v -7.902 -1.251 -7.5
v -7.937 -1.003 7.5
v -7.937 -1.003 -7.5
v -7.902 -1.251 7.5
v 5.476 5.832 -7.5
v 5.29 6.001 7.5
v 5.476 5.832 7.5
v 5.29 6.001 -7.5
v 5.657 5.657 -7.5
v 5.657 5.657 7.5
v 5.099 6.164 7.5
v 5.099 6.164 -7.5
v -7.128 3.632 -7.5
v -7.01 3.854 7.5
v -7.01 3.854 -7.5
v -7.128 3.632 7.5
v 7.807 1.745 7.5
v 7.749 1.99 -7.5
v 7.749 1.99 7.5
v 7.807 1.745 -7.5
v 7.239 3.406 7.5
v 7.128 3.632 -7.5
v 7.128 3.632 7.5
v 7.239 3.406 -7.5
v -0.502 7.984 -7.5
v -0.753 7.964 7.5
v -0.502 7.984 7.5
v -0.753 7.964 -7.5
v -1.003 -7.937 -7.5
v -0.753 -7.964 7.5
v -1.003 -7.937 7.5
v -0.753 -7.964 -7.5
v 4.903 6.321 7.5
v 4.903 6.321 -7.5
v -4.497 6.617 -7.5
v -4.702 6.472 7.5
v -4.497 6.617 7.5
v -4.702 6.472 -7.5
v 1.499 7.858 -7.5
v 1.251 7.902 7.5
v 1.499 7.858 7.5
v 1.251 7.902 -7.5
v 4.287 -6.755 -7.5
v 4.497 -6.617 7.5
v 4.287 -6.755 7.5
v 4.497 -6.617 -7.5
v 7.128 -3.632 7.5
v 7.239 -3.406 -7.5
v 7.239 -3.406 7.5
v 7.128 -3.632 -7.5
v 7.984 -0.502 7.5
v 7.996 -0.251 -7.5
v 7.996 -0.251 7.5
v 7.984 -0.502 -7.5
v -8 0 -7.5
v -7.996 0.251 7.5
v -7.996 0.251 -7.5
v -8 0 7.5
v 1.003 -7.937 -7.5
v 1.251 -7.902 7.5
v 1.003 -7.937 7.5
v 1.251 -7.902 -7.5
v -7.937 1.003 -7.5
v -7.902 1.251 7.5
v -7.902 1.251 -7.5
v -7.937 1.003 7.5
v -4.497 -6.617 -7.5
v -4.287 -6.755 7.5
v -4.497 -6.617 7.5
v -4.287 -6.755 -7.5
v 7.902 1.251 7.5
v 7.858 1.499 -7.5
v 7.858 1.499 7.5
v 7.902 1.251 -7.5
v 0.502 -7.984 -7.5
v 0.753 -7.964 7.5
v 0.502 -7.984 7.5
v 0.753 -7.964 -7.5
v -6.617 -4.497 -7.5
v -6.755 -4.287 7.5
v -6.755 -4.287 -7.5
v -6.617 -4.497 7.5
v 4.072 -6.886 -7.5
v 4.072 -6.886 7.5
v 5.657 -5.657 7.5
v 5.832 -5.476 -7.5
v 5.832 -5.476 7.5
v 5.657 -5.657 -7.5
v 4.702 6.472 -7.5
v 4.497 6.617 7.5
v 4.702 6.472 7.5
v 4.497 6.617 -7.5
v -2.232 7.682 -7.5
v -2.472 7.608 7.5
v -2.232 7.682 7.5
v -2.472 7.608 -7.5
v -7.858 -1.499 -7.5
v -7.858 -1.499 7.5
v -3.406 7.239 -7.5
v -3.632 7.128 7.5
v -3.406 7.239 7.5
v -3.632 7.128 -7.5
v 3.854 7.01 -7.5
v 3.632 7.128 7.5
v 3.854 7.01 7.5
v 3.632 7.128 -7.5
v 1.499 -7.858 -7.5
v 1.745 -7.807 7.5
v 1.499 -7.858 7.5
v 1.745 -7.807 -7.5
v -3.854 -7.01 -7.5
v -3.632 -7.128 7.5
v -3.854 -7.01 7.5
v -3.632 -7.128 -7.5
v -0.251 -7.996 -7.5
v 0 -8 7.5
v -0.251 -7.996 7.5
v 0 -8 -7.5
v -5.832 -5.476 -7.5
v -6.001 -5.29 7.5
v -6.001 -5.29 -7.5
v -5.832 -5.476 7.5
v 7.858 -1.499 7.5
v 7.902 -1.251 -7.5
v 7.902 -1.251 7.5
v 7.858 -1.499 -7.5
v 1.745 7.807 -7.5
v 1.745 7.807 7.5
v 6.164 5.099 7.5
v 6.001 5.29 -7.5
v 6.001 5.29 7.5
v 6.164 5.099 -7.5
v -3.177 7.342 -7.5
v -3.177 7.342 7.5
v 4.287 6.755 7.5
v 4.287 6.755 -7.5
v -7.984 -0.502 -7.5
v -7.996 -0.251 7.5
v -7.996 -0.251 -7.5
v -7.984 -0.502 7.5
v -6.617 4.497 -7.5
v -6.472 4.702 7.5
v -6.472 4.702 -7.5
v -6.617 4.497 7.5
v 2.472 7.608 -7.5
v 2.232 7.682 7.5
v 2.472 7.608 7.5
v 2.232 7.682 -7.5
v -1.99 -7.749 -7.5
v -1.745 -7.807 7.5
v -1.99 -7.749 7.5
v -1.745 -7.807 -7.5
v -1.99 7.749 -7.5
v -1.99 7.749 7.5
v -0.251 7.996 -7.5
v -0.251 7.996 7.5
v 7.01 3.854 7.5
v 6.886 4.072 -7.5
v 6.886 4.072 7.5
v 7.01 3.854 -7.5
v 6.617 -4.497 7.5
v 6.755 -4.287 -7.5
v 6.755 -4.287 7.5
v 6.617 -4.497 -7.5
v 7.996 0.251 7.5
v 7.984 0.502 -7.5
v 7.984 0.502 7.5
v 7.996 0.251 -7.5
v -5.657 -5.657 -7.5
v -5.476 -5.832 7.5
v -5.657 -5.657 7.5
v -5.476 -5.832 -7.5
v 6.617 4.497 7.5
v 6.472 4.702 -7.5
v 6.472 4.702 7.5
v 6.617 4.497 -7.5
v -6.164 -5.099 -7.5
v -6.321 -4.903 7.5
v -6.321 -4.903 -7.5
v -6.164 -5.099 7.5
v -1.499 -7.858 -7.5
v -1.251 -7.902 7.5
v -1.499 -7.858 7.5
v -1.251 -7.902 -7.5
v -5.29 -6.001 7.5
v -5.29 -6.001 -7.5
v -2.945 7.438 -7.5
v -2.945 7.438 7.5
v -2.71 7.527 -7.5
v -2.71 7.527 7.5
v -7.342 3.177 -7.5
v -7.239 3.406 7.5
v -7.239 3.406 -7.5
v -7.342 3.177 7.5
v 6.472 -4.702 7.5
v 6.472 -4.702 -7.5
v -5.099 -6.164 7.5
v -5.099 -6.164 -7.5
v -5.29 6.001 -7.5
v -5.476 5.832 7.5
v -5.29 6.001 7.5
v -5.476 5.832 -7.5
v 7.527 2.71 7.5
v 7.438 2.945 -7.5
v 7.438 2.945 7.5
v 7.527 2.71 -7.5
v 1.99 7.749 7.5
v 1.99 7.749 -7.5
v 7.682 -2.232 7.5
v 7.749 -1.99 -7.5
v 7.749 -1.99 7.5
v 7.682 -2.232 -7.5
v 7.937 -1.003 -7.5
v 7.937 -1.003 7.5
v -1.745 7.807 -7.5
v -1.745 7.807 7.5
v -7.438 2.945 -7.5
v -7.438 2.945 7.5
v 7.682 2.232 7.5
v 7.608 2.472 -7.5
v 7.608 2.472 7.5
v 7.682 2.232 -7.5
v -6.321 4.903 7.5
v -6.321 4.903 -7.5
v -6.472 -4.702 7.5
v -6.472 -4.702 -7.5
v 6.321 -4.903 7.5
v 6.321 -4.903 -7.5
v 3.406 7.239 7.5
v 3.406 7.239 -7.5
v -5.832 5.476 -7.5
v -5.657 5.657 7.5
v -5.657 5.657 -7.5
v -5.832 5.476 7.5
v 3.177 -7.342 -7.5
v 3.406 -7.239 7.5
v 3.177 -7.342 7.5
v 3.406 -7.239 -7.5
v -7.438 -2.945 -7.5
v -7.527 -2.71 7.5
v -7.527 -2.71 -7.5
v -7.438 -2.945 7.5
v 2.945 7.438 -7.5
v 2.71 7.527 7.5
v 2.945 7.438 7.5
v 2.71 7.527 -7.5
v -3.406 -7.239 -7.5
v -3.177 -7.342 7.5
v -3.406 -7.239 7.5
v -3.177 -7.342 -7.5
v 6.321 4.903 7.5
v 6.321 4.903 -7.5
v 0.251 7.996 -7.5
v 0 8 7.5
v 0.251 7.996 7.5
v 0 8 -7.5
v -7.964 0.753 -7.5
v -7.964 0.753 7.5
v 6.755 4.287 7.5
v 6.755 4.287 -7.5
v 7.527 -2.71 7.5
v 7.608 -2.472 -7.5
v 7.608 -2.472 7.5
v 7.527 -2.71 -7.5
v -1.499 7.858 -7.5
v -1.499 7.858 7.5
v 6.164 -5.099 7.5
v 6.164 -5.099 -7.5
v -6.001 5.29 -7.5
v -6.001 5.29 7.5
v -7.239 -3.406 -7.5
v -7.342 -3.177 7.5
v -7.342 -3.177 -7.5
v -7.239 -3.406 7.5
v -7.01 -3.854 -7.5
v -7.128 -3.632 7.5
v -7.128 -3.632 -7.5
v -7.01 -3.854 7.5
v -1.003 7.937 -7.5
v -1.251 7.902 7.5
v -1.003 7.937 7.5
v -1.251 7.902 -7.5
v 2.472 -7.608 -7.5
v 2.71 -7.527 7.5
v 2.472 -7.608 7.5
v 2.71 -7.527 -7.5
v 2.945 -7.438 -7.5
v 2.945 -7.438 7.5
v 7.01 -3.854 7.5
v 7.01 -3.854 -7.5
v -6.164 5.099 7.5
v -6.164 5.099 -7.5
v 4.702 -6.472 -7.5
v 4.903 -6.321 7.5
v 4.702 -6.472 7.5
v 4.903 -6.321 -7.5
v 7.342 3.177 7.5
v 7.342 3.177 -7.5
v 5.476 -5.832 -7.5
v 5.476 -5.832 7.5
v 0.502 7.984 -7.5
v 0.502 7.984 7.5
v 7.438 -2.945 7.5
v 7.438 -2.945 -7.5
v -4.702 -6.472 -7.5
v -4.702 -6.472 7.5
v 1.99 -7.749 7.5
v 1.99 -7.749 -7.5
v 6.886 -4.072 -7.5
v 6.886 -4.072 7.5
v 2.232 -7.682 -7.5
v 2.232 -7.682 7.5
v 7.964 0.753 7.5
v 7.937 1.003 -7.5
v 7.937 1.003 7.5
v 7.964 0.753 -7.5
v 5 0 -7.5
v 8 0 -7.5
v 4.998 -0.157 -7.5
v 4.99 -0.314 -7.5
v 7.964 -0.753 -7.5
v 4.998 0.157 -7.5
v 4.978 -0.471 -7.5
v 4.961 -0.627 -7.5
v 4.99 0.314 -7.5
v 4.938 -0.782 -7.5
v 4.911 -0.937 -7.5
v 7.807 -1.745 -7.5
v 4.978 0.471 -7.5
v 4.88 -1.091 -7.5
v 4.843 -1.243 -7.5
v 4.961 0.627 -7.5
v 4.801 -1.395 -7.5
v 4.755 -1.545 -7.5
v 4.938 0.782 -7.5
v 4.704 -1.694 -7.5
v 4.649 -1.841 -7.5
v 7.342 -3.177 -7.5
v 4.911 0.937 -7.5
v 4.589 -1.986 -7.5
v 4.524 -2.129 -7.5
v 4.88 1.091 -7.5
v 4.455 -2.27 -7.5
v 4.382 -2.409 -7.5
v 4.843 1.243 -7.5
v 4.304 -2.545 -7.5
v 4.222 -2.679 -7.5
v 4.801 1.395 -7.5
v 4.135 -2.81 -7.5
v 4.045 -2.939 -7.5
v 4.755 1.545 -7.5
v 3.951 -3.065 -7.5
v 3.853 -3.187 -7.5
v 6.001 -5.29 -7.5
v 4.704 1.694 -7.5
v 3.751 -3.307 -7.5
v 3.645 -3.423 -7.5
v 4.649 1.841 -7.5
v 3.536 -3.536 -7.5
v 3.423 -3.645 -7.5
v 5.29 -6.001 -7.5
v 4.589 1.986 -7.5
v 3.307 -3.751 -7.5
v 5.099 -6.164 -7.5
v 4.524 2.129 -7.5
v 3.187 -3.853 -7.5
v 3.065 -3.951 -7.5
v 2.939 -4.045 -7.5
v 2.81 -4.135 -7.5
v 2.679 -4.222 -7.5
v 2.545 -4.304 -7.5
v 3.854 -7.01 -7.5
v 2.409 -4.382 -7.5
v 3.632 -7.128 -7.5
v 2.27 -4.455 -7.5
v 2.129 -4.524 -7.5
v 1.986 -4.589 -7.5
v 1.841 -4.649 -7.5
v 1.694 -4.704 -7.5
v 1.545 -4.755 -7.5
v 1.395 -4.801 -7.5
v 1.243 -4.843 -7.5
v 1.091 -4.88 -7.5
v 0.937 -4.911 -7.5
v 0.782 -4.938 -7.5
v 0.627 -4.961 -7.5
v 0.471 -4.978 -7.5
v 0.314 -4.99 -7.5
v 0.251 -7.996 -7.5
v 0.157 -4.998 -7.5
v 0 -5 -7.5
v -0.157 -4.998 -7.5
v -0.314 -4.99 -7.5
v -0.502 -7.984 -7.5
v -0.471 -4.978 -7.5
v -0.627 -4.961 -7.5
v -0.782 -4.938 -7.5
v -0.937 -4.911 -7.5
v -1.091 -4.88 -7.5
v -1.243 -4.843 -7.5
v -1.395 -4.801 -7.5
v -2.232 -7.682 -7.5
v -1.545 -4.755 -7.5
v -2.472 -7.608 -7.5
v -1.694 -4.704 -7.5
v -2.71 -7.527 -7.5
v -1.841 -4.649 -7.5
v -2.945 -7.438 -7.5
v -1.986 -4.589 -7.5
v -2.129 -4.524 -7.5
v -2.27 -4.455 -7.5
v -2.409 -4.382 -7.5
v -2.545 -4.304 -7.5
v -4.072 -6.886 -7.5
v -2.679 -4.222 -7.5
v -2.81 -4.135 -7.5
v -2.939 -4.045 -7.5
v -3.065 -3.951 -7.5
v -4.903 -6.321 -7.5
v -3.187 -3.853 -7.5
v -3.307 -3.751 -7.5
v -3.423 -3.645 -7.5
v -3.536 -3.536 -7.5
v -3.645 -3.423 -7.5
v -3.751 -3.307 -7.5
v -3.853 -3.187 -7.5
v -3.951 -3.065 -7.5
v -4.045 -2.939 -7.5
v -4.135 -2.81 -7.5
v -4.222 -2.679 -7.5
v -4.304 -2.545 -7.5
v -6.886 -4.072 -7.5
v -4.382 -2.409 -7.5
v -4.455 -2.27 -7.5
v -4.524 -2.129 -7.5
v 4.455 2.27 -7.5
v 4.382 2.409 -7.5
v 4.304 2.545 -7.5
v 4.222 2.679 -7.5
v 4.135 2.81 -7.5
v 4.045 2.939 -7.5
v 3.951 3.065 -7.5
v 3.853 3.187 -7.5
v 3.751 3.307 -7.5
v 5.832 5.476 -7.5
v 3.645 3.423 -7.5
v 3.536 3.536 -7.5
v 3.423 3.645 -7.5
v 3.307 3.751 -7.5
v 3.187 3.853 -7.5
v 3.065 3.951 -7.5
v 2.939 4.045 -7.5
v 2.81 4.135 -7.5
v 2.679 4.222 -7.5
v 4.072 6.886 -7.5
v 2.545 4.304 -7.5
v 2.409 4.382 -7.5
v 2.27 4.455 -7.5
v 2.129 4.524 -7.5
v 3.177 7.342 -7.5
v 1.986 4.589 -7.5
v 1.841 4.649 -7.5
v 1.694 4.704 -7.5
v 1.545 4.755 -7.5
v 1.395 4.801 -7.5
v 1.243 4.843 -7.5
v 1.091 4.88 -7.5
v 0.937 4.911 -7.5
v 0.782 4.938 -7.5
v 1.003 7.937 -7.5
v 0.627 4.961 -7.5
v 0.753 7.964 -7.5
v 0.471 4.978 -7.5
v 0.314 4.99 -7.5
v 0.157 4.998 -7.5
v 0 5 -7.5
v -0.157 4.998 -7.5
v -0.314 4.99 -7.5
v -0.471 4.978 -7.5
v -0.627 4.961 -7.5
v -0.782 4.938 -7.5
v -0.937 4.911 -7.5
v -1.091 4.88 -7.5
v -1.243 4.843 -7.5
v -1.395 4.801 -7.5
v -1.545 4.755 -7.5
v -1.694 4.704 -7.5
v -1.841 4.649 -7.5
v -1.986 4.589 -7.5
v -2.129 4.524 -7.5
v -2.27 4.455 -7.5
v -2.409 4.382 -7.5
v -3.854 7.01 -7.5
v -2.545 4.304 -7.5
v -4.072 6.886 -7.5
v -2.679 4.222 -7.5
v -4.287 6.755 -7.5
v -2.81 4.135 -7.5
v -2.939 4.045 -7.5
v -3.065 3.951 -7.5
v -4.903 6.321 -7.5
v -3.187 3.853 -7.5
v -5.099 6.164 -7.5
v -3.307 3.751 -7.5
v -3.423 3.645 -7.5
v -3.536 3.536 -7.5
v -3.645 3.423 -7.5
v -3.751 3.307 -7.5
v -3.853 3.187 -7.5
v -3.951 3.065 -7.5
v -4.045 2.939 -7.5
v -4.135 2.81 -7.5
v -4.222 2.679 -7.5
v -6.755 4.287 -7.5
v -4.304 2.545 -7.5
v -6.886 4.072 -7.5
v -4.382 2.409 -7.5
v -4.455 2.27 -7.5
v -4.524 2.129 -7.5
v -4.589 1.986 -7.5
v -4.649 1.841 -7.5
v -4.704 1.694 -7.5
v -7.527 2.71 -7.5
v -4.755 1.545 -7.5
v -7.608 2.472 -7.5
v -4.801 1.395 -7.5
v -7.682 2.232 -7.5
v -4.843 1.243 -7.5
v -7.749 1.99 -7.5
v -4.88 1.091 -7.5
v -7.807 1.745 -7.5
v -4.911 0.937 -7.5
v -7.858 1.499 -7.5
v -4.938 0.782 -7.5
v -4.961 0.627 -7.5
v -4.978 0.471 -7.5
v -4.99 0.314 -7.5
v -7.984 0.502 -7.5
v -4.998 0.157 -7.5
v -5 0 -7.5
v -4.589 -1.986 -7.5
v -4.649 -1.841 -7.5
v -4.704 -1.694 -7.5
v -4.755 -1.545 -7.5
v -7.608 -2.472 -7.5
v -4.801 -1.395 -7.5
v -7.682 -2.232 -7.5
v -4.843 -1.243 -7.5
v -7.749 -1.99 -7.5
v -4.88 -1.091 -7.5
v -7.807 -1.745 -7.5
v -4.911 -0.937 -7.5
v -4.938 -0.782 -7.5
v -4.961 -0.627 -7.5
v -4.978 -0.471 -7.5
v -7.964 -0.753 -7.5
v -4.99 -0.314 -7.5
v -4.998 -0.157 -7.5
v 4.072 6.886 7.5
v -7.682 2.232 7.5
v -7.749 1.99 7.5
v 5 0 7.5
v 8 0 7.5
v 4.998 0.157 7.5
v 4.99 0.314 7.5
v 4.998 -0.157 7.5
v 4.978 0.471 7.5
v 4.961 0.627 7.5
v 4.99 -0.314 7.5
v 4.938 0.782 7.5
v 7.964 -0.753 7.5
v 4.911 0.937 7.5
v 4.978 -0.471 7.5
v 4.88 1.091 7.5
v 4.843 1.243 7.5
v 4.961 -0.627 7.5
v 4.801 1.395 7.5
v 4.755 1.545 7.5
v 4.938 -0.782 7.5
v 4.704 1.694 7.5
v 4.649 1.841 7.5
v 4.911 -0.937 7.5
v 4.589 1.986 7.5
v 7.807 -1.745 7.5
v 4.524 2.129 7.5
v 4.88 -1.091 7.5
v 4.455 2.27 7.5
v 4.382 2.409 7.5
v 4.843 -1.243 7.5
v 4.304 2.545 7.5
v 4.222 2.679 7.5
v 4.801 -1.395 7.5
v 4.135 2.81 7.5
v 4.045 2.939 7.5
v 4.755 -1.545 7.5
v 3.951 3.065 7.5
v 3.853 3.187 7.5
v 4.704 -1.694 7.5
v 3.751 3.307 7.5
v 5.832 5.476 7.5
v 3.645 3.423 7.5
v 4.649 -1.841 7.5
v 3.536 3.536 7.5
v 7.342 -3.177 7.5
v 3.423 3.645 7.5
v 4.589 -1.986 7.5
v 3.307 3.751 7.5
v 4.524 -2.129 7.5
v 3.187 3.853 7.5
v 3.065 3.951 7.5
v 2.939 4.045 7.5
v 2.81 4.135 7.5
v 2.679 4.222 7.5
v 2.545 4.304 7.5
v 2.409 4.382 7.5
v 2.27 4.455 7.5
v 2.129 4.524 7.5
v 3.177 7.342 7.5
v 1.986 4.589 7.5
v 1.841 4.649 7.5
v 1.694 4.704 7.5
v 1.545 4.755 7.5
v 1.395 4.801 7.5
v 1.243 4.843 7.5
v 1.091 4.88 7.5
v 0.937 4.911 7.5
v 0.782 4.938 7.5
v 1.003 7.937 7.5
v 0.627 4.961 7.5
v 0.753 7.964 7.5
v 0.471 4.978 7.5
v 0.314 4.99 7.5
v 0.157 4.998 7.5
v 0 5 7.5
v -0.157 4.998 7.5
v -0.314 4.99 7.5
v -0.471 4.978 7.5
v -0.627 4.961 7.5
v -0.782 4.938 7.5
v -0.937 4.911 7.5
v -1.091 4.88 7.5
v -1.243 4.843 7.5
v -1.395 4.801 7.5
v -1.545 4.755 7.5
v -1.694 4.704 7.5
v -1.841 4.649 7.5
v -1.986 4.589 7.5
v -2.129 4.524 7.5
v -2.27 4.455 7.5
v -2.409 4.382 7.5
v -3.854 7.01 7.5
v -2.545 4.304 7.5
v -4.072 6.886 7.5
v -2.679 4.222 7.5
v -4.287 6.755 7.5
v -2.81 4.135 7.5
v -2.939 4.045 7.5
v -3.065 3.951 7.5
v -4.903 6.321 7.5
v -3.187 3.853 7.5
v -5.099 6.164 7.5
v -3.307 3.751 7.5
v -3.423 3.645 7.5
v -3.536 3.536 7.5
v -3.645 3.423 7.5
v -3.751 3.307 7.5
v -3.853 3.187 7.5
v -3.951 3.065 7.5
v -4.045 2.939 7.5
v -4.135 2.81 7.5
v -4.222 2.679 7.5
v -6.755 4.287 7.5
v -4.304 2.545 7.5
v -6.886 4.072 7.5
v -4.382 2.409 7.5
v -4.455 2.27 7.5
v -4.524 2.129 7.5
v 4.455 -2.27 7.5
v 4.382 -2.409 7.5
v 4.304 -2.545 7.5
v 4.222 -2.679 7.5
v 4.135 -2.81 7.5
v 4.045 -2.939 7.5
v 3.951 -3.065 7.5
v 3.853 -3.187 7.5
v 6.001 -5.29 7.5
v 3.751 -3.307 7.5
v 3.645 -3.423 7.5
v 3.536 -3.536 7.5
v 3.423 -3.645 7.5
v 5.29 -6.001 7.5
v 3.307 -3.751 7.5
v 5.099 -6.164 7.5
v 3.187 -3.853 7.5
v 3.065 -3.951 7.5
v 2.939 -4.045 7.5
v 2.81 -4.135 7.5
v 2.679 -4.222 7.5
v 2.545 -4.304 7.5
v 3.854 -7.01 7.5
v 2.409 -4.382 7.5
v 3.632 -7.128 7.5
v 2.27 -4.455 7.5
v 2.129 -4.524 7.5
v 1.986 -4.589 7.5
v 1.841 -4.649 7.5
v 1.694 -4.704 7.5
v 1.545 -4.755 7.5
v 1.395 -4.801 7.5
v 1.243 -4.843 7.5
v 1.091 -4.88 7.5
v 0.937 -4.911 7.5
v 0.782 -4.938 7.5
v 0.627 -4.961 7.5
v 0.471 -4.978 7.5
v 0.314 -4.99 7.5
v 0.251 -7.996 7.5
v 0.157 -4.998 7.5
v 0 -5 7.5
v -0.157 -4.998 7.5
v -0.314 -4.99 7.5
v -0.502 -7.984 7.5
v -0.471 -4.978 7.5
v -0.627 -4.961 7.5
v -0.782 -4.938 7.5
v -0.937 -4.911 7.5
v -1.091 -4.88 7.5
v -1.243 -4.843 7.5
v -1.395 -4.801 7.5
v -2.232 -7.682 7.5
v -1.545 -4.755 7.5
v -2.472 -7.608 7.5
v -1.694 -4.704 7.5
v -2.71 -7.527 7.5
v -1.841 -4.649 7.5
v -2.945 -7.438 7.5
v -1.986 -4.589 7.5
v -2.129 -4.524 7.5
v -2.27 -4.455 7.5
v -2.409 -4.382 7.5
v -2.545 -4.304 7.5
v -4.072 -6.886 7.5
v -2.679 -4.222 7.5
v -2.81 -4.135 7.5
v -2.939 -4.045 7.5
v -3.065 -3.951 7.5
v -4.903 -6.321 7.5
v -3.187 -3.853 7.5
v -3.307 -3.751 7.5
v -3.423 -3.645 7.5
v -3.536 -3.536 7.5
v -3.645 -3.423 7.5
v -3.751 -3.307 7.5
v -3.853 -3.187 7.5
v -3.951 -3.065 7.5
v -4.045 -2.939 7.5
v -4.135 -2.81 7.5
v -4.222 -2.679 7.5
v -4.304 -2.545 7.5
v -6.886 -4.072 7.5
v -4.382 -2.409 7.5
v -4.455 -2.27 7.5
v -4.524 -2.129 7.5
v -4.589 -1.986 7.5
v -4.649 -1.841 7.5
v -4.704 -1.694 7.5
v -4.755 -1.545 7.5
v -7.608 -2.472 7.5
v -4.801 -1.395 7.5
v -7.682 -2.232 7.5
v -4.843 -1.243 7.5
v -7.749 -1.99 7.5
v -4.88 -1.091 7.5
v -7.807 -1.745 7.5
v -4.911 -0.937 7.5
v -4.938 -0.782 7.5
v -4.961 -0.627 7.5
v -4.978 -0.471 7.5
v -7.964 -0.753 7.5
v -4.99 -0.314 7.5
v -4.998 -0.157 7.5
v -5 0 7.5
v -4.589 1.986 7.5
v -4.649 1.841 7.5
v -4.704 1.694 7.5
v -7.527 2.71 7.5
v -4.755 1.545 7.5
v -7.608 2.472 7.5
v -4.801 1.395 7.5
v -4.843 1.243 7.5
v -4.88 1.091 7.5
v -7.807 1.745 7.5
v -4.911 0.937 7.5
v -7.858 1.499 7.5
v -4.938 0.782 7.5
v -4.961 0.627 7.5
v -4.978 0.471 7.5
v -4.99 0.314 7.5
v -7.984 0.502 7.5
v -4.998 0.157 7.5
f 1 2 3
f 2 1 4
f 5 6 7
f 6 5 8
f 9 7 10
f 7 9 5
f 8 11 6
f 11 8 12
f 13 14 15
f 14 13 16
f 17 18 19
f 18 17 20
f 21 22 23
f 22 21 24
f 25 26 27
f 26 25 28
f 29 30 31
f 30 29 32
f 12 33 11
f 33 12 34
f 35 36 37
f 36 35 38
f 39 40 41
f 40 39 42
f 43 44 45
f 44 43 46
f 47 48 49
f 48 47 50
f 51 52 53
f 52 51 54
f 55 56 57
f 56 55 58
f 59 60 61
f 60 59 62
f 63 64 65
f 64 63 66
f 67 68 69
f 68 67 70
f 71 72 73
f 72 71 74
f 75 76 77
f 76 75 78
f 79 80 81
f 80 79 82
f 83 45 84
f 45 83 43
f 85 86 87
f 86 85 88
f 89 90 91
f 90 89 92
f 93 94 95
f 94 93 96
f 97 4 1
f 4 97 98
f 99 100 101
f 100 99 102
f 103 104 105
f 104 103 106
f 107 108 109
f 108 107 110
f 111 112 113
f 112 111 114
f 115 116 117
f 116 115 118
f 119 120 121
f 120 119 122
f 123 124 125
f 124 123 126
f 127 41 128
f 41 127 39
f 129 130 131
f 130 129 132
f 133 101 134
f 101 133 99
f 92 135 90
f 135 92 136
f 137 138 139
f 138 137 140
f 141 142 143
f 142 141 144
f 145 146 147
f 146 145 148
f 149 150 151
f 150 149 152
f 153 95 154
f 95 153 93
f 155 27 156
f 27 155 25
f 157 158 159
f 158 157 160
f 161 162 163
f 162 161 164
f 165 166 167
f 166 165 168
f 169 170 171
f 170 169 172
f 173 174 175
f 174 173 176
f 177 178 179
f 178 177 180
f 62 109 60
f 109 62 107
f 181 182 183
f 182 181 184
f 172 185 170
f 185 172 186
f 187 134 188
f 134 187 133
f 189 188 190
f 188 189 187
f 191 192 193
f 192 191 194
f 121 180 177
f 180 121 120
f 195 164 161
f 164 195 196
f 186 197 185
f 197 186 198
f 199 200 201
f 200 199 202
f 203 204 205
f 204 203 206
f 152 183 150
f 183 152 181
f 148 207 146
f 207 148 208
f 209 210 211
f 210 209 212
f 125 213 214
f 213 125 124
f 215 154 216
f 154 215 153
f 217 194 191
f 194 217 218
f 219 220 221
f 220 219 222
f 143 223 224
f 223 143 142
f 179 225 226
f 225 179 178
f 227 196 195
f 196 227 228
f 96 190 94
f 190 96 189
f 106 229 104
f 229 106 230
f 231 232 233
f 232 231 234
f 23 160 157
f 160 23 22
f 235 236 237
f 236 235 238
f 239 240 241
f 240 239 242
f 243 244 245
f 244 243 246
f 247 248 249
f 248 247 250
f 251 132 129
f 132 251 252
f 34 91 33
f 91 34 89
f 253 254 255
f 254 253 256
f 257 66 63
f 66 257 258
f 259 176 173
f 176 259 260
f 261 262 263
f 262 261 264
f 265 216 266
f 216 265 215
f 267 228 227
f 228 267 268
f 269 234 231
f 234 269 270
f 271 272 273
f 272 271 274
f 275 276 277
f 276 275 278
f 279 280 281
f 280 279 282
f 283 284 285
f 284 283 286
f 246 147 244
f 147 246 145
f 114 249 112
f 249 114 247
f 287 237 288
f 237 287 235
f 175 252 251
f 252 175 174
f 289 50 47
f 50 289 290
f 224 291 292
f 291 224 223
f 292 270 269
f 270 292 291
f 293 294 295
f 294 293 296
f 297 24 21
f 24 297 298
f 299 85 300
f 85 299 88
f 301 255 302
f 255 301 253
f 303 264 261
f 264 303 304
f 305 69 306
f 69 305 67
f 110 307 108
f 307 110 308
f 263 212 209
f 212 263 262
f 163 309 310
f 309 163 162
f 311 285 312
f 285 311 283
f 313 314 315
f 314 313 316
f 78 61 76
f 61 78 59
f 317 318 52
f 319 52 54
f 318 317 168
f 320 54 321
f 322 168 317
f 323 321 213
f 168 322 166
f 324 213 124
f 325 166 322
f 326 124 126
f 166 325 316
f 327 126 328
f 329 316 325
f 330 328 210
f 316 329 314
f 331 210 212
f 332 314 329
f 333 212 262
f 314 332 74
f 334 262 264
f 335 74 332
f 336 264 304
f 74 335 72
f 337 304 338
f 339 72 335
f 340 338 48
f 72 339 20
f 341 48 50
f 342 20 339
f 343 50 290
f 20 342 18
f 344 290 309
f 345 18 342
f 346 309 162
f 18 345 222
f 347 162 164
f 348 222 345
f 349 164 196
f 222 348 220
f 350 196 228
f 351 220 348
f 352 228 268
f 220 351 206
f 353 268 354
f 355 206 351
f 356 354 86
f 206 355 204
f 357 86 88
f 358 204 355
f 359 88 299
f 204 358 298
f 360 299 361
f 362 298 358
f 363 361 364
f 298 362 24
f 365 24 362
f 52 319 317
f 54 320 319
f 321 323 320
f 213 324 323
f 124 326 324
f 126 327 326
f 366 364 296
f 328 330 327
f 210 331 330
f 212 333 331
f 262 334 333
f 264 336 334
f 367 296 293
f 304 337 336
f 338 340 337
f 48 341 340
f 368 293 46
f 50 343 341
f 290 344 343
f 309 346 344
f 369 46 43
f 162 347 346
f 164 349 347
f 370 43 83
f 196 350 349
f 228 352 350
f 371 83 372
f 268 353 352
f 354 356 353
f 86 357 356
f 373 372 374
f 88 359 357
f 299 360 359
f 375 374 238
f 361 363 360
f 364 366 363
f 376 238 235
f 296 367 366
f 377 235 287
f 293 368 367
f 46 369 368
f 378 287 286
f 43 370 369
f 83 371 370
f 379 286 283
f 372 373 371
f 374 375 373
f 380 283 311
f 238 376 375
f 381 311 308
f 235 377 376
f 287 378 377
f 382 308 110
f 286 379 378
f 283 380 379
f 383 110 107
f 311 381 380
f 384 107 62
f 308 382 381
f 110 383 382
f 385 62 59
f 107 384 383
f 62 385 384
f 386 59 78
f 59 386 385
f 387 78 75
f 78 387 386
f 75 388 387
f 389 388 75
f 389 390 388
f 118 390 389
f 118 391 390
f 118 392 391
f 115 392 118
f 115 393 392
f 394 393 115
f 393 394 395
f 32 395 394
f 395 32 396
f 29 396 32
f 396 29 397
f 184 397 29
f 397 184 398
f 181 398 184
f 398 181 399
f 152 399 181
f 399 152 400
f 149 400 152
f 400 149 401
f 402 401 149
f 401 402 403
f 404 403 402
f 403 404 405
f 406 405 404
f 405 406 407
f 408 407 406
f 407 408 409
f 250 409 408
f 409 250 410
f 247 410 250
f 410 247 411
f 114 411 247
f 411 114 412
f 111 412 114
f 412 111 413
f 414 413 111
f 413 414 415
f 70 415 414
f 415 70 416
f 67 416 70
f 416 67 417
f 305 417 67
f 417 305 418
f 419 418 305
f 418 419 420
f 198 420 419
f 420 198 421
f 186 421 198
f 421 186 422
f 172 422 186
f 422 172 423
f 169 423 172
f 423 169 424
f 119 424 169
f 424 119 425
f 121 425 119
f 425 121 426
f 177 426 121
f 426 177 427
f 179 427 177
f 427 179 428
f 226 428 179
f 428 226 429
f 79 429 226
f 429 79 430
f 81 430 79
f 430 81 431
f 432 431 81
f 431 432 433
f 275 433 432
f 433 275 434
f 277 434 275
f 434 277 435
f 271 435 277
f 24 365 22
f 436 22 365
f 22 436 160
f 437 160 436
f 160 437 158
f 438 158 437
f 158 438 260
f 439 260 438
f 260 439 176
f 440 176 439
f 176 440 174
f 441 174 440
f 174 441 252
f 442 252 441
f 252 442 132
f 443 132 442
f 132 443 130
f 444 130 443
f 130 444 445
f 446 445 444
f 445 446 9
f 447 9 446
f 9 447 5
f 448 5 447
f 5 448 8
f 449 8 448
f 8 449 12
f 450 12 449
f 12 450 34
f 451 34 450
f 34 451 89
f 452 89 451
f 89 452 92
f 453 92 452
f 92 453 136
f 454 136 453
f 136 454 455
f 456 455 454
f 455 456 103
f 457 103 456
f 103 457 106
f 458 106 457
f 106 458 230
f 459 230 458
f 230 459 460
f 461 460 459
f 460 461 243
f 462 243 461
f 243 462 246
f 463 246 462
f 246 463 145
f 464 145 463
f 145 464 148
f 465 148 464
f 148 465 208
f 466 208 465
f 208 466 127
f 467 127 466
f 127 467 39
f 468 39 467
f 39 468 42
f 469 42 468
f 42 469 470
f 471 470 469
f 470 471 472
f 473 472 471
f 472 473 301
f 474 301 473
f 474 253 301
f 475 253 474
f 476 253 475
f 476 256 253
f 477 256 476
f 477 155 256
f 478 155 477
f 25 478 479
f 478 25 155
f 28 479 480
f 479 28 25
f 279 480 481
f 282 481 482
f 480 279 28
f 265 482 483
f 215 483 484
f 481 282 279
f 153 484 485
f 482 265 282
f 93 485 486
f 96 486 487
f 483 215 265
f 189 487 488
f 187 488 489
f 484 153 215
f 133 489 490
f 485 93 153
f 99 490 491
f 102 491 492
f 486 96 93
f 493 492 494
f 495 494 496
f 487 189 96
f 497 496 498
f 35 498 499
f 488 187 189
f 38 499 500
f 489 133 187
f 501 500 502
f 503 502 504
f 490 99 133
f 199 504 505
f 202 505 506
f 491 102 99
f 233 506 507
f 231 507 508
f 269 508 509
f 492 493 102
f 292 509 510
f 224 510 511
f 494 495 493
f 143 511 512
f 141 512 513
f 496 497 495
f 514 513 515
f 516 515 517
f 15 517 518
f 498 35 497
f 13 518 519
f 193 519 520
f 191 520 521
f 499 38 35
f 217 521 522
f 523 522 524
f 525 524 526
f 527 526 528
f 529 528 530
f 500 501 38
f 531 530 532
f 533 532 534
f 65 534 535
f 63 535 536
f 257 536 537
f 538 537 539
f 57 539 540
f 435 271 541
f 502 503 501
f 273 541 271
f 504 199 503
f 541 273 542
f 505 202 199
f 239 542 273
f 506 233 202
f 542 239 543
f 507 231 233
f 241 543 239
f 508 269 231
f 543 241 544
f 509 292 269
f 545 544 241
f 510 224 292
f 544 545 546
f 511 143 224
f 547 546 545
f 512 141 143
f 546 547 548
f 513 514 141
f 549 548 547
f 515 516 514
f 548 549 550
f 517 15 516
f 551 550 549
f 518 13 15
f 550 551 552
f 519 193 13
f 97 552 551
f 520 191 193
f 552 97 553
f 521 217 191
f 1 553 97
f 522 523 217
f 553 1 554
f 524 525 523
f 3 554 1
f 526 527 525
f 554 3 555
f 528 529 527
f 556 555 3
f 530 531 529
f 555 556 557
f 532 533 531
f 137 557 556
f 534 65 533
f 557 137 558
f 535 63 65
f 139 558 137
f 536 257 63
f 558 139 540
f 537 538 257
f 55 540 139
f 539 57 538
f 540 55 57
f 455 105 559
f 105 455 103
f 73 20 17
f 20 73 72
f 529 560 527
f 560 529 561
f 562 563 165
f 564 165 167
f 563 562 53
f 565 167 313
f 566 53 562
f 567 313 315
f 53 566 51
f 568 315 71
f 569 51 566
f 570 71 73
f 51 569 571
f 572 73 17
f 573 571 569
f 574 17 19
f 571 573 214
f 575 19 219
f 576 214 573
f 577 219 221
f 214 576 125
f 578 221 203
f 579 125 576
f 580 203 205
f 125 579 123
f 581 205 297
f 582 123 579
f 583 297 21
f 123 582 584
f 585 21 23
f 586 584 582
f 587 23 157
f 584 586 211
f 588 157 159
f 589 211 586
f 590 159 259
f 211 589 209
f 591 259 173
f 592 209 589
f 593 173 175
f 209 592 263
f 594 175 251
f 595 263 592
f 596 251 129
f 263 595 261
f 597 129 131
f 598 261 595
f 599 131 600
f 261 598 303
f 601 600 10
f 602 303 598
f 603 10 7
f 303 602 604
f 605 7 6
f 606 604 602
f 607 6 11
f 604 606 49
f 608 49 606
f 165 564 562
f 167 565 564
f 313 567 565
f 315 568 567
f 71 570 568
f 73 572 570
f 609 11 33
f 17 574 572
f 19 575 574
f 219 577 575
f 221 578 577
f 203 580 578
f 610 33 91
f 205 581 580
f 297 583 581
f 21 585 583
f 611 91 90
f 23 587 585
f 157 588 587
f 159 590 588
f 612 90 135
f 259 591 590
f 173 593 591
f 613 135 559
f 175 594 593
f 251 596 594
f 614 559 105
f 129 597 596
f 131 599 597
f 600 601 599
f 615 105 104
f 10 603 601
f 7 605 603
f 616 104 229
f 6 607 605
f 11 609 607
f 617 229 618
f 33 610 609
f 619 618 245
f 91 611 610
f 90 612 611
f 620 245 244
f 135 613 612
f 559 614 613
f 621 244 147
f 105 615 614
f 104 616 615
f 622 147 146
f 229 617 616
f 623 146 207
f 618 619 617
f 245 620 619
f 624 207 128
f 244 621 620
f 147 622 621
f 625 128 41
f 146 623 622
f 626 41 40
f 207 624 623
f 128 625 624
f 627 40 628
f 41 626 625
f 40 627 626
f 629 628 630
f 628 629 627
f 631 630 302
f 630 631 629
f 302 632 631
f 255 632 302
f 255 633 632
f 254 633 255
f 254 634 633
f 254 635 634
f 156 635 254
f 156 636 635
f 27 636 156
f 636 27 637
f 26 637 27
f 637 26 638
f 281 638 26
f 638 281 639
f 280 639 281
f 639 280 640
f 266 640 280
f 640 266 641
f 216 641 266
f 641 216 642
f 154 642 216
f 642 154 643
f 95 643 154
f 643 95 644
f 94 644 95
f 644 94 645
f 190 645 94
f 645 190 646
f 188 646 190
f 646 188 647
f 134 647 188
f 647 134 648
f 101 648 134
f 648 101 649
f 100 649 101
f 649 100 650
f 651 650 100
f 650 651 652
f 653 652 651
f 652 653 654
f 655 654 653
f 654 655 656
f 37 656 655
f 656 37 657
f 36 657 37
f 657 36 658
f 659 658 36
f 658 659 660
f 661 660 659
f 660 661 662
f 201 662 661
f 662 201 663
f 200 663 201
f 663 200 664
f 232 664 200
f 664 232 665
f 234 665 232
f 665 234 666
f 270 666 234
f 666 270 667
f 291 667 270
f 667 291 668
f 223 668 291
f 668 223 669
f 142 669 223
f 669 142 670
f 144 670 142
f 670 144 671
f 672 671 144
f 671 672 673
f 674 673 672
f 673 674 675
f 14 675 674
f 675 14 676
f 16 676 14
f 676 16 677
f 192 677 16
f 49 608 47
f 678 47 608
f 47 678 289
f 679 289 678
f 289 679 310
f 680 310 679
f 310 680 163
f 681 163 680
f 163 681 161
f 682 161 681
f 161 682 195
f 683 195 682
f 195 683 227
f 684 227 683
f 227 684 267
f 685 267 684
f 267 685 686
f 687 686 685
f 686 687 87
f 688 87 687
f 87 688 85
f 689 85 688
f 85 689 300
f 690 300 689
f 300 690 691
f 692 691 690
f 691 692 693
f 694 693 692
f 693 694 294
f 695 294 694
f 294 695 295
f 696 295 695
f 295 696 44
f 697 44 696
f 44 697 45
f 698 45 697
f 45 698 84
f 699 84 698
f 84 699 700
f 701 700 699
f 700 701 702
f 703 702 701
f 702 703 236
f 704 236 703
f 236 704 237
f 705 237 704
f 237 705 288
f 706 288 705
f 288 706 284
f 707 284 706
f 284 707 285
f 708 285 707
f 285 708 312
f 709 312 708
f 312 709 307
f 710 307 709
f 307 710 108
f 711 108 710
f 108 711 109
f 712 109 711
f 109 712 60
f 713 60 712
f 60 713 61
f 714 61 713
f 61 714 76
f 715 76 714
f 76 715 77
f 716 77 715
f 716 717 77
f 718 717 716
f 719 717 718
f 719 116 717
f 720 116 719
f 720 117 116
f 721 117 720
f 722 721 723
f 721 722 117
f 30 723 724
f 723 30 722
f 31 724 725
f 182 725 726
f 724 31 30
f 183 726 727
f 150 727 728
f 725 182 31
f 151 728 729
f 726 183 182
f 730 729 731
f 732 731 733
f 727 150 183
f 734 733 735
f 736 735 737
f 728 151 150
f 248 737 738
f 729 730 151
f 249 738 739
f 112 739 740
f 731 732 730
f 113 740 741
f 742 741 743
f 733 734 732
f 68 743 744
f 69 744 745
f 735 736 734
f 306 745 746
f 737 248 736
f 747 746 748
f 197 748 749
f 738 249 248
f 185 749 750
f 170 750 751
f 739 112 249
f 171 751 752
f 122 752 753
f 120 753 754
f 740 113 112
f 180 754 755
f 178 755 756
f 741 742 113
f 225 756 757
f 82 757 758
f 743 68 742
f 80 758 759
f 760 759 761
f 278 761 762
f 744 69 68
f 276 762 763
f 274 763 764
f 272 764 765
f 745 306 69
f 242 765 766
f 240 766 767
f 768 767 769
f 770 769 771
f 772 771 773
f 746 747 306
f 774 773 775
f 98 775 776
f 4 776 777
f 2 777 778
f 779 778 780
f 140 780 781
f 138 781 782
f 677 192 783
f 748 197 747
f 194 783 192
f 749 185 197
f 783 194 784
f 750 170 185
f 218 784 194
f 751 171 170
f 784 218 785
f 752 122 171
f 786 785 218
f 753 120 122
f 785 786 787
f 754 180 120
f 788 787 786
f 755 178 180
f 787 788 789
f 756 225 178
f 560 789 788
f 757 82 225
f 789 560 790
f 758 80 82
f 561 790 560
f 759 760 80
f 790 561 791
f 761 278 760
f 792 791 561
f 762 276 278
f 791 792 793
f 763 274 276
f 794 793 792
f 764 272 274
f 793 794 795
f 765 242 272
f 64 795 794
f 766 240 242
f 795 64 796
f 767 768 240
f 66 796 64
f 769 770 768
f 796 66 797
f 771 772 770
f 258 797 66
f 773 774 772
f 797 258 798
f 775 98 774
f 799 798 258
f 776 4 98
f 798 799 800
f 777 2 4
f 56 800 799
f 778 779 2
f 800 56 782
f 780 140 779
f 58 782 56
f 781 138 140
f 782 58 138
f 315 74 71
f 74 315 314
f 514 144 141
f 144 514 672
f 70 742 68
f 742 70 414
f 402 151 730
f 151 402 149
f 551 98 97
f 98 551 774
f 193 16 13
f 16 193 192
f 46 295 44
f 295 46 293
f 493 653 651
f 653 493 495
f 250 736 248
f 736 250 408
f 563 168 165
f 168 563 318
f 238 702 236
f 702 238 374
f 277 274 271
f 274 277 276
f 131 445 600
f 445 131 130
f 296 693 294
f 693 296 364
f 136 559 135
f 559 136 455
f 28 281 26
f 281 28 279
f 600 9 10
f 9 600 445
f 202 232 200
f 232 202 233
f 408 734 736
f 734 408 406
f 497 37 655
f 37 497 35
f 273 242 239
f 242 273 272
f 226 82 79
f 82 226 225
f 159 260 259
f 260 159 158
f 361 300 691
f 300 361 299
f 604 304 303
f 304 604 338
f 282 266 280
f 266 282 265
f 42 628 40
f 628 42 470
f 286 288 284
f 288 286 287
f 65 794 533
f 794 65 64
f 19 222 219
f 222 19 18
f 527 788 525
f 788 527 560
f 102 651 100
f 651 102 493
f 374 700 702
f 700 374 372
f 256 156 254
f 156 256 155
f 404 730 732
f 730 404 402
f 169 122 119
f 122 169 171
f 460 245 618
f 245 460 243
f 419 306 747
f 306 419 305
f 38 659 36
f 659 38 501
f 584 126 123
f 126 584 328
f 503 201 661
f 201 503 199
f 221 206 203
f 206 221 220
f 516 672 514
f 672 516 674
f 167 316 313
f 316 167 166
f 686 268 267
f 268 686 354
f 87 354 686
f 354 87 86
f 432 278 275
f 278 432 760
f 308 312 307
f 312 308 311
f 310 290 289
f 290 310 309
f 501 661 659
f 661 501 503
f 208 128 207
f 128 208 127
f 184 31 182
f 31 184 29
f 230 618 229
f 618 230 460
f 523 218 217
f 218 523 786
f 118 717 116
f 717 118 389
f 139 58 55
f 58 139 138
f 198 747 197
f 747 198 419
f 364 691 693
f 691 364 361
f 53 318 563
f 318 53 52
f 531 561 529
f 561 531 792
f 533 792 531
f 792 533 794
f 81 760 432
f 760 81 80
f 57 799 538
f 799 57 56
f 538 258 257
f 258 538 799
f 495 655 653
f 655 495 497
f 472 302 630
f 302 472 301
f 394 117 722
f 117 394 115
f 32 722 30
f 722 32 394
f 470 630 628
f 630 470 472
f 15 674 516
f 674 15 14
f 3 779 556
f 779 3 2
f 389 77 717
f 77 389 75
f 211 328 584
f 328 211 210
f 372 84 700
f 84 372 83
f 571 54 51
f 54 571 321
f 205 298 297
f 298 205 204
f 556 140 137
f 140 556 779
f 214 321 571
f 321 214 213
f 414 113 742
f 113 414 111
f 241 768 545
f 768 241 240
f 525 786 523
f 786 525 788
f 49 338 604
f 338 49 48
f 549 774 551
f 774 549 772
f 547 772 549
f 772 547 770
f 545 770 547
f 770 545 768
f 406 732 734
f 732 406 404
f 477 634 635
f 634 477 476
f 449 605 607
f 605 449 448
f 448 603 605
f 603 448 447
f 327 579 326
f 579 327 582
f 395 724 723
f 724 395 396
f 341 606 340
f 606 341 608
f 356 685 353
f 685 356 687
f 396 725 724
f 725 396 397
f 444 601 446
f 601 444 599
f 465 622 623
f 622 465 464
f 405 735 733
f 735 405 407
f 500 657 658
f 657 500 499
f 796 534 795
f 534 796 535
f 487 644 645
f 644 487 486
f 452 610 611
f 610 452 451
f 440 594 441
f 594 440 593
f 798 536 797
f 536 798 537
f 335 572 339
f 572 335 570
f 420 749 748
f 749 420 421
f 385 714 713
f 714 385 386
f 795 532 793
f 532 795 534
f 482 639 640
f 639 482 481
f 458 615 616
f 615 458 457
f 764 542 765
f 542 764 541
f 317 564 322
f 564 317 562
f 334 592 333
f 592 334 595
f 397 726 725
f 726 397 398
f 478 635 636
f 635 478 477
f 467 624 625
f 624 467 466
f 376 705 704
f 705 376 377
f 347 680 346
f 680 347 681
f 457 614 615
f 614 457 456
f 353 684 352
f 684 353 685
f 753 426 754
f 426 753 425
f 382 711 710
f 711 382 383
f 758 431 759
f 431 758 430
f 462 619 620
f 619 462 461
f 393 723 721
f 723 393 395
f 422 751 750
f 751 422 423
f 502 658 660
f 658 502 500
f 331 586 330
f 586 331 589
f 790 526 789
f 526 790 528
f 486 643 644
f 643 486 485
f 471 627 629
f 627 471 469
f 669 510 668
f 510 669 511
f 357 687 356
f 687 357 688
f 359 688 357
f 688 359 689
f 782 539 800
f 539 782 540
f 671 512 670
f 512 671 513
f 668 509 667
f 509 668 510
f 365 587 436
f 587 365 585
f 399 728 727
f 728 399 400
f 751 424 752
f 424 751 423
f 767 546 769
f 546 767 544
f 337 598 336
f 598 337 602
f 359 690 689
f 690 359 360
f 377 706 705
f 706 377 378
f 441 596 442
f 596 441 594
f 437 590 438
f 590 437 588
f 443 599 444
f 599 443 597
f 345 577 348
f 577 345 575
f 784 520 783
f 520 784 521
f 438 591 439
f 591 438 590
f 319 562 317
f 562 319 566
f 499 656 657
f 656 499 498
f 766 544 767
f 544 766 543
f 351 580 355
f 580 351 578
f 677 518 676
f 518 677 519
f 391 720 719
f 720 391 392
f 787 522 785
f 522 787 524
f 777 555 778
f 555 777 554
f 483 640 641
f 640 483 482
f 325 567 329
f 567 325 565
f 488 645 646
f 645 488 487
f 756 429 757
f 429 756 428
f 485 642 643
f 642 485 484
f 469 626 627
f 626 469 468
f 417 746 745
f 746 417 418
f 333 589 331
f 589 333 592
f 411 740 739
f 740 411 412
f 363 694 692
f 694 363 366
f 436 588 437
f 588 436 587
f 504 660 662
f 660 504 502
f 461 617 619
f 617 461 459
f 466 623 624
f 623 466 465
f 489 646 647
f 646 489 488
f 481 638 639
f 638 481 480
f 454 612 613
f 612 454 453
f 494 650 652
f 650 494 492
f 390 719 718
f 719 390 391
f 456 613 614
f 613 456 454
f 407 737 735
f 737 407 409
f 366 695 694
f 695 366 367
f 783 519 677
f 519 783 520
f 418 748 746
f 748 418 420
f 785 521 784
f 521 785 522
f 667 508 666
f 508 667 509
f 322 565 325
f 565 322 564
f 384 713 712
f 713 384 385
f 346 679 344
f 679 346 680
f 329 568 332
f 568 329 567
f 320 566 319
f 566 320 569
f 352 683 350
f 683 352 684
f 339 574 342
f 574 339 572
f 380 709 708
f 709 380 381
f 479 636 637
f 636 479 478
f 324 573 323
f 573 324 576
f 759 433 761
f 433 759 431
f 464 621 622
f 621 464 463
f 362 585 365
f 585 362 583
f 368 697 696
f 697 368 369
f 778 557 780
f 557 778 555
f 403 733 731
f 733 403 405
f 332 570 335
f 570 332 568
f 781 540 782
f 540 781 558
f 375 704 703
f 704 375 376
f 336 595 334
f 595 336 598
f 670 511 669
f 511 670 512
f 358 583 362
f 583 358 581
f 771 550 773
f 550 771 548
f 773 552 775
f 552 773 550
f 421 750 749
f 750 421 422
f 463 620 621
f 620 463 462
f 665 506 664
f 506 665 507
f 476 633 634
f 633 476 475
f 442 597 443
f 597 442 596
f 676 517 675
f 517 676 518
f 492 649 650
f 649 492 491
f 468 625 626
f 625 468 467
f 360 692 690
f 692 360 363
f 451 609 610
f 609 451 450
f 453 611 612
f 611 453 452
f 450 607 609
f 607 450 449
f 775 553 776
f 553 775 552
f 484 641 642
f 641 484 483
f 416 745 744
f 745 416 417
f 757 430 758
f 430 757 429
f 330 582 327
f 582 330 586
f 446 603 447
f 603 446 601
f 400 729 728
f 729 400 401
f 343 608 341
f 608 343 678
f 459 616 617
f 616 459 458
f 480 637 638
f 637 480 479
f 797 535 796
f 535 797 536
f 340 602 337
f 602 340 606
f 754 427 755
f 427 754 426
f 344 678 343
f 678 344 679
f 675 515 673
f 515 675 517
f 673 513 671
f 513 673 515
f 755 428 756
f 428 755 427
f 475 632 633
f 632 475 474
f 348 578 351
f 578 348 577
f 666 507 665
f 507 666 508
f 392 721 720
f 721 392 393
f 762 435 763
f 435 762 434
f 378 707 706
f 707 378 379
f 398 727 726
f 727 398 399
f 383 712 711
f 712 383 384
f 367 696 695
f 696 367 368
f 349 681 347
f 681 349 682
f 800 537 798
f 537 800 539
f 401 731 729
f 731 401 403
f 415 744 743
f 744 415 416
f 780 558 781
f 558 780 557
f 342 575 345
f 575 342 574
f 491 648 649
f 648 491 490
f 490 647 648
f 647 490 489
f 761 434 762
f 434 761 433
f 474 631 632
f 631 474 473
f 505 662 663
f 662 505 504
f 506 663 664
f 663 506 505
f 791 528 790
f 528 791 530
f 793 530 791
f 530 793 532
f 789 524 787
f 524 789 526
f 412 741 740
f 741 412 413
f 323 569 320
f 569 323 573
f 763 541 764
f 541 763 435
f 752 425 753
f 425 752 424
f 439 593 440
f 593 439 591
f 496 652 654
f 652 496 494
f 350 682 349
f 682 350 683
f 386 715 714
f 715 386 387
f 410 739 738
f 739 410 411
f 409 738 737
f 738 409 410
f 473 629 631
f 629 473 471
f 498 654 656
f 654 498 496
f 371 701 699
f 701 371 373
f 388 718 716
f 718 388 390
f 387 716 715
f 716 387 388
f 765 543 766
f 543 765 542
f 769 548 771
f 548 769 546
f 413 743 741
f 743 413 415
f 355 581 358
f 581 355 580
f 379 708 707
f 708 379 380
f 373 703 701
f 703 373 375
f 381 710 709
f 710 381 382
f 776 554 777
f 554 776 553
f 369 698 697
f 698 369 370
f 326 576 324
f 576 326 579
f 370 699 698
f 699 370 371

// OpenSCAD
// file: vars.scad
/* Makefile needs */
PART = "none";
IMAGE = "none";

/* frame */
height = 690;
width = 500;
depth = 500;

frame_size = 20;
frame_half = frame_size / 2;

glass_height = 3;
glass_width = 400;
glass_depth = 400;

rail_diam = 10;
z_rail_width = 60;
z_carriage_width = z_rail_width + frame_size;

// Sources for Metric fastener dimensions
// http://www.carbidedepot.com/formulas-tap-metric.htm
// http://www.roymech.co.uk/Useful_Tables/Screws/cap_screws.htm
// https://www.fairburyfastener.com/xdims_metric_nuts.htm

// M5
M5_bolt_diam = 5;
M5_bolt_hole = 5.5;
M5_nut_height = 4;
M5_nut_width = 7.9;
M5_nut_diam = 9;

// M4
M4_bolt_diam = 4;
M4_bolt_hole = 4.5;
M4_nut_height = 3.5;
M4_nut_width = 6.9;
M4_nut_diam = 8;


//608zz
608zz_height=7;
608zz_od=22;
608zz_id=8;
608zz_race=11;



// Height adjustment
pivot_diam=12;
height_bolt_diam=M4_bolt_diam;
// main file
/*
 *
 * Copyright 2019 Tim Schaller
 * All rights reserved
 * Released under the GPL3
 * No claims are made as to the fitness and/or corectness of
 * this work. Use at your own risk. If you create useless things,
 * or if the parts fail it is on you NOT ME. As far as I know
 * this might make your printer burst into flames or print
 * little pink bunnies. You call. };->
 *
 */


include <vars.scad>;

PART = "bronze_bearing";

if (PART == "bronze_bearing") {
    rotate([0, 0, 45])
    bronze_bearing();
}

/* ========================================================= */
/* MODULES                                                   */
/* ========================================================= */


module bronze_bearing(id=10, od=16, length=15) {
  color("DarkGoldenrod")
  difference(){
    cylinder(h=length,   d=od, $fn=200, center=true);
    cylinder(h=length+1, d=id, $fn=200, center=true);
  }
}
